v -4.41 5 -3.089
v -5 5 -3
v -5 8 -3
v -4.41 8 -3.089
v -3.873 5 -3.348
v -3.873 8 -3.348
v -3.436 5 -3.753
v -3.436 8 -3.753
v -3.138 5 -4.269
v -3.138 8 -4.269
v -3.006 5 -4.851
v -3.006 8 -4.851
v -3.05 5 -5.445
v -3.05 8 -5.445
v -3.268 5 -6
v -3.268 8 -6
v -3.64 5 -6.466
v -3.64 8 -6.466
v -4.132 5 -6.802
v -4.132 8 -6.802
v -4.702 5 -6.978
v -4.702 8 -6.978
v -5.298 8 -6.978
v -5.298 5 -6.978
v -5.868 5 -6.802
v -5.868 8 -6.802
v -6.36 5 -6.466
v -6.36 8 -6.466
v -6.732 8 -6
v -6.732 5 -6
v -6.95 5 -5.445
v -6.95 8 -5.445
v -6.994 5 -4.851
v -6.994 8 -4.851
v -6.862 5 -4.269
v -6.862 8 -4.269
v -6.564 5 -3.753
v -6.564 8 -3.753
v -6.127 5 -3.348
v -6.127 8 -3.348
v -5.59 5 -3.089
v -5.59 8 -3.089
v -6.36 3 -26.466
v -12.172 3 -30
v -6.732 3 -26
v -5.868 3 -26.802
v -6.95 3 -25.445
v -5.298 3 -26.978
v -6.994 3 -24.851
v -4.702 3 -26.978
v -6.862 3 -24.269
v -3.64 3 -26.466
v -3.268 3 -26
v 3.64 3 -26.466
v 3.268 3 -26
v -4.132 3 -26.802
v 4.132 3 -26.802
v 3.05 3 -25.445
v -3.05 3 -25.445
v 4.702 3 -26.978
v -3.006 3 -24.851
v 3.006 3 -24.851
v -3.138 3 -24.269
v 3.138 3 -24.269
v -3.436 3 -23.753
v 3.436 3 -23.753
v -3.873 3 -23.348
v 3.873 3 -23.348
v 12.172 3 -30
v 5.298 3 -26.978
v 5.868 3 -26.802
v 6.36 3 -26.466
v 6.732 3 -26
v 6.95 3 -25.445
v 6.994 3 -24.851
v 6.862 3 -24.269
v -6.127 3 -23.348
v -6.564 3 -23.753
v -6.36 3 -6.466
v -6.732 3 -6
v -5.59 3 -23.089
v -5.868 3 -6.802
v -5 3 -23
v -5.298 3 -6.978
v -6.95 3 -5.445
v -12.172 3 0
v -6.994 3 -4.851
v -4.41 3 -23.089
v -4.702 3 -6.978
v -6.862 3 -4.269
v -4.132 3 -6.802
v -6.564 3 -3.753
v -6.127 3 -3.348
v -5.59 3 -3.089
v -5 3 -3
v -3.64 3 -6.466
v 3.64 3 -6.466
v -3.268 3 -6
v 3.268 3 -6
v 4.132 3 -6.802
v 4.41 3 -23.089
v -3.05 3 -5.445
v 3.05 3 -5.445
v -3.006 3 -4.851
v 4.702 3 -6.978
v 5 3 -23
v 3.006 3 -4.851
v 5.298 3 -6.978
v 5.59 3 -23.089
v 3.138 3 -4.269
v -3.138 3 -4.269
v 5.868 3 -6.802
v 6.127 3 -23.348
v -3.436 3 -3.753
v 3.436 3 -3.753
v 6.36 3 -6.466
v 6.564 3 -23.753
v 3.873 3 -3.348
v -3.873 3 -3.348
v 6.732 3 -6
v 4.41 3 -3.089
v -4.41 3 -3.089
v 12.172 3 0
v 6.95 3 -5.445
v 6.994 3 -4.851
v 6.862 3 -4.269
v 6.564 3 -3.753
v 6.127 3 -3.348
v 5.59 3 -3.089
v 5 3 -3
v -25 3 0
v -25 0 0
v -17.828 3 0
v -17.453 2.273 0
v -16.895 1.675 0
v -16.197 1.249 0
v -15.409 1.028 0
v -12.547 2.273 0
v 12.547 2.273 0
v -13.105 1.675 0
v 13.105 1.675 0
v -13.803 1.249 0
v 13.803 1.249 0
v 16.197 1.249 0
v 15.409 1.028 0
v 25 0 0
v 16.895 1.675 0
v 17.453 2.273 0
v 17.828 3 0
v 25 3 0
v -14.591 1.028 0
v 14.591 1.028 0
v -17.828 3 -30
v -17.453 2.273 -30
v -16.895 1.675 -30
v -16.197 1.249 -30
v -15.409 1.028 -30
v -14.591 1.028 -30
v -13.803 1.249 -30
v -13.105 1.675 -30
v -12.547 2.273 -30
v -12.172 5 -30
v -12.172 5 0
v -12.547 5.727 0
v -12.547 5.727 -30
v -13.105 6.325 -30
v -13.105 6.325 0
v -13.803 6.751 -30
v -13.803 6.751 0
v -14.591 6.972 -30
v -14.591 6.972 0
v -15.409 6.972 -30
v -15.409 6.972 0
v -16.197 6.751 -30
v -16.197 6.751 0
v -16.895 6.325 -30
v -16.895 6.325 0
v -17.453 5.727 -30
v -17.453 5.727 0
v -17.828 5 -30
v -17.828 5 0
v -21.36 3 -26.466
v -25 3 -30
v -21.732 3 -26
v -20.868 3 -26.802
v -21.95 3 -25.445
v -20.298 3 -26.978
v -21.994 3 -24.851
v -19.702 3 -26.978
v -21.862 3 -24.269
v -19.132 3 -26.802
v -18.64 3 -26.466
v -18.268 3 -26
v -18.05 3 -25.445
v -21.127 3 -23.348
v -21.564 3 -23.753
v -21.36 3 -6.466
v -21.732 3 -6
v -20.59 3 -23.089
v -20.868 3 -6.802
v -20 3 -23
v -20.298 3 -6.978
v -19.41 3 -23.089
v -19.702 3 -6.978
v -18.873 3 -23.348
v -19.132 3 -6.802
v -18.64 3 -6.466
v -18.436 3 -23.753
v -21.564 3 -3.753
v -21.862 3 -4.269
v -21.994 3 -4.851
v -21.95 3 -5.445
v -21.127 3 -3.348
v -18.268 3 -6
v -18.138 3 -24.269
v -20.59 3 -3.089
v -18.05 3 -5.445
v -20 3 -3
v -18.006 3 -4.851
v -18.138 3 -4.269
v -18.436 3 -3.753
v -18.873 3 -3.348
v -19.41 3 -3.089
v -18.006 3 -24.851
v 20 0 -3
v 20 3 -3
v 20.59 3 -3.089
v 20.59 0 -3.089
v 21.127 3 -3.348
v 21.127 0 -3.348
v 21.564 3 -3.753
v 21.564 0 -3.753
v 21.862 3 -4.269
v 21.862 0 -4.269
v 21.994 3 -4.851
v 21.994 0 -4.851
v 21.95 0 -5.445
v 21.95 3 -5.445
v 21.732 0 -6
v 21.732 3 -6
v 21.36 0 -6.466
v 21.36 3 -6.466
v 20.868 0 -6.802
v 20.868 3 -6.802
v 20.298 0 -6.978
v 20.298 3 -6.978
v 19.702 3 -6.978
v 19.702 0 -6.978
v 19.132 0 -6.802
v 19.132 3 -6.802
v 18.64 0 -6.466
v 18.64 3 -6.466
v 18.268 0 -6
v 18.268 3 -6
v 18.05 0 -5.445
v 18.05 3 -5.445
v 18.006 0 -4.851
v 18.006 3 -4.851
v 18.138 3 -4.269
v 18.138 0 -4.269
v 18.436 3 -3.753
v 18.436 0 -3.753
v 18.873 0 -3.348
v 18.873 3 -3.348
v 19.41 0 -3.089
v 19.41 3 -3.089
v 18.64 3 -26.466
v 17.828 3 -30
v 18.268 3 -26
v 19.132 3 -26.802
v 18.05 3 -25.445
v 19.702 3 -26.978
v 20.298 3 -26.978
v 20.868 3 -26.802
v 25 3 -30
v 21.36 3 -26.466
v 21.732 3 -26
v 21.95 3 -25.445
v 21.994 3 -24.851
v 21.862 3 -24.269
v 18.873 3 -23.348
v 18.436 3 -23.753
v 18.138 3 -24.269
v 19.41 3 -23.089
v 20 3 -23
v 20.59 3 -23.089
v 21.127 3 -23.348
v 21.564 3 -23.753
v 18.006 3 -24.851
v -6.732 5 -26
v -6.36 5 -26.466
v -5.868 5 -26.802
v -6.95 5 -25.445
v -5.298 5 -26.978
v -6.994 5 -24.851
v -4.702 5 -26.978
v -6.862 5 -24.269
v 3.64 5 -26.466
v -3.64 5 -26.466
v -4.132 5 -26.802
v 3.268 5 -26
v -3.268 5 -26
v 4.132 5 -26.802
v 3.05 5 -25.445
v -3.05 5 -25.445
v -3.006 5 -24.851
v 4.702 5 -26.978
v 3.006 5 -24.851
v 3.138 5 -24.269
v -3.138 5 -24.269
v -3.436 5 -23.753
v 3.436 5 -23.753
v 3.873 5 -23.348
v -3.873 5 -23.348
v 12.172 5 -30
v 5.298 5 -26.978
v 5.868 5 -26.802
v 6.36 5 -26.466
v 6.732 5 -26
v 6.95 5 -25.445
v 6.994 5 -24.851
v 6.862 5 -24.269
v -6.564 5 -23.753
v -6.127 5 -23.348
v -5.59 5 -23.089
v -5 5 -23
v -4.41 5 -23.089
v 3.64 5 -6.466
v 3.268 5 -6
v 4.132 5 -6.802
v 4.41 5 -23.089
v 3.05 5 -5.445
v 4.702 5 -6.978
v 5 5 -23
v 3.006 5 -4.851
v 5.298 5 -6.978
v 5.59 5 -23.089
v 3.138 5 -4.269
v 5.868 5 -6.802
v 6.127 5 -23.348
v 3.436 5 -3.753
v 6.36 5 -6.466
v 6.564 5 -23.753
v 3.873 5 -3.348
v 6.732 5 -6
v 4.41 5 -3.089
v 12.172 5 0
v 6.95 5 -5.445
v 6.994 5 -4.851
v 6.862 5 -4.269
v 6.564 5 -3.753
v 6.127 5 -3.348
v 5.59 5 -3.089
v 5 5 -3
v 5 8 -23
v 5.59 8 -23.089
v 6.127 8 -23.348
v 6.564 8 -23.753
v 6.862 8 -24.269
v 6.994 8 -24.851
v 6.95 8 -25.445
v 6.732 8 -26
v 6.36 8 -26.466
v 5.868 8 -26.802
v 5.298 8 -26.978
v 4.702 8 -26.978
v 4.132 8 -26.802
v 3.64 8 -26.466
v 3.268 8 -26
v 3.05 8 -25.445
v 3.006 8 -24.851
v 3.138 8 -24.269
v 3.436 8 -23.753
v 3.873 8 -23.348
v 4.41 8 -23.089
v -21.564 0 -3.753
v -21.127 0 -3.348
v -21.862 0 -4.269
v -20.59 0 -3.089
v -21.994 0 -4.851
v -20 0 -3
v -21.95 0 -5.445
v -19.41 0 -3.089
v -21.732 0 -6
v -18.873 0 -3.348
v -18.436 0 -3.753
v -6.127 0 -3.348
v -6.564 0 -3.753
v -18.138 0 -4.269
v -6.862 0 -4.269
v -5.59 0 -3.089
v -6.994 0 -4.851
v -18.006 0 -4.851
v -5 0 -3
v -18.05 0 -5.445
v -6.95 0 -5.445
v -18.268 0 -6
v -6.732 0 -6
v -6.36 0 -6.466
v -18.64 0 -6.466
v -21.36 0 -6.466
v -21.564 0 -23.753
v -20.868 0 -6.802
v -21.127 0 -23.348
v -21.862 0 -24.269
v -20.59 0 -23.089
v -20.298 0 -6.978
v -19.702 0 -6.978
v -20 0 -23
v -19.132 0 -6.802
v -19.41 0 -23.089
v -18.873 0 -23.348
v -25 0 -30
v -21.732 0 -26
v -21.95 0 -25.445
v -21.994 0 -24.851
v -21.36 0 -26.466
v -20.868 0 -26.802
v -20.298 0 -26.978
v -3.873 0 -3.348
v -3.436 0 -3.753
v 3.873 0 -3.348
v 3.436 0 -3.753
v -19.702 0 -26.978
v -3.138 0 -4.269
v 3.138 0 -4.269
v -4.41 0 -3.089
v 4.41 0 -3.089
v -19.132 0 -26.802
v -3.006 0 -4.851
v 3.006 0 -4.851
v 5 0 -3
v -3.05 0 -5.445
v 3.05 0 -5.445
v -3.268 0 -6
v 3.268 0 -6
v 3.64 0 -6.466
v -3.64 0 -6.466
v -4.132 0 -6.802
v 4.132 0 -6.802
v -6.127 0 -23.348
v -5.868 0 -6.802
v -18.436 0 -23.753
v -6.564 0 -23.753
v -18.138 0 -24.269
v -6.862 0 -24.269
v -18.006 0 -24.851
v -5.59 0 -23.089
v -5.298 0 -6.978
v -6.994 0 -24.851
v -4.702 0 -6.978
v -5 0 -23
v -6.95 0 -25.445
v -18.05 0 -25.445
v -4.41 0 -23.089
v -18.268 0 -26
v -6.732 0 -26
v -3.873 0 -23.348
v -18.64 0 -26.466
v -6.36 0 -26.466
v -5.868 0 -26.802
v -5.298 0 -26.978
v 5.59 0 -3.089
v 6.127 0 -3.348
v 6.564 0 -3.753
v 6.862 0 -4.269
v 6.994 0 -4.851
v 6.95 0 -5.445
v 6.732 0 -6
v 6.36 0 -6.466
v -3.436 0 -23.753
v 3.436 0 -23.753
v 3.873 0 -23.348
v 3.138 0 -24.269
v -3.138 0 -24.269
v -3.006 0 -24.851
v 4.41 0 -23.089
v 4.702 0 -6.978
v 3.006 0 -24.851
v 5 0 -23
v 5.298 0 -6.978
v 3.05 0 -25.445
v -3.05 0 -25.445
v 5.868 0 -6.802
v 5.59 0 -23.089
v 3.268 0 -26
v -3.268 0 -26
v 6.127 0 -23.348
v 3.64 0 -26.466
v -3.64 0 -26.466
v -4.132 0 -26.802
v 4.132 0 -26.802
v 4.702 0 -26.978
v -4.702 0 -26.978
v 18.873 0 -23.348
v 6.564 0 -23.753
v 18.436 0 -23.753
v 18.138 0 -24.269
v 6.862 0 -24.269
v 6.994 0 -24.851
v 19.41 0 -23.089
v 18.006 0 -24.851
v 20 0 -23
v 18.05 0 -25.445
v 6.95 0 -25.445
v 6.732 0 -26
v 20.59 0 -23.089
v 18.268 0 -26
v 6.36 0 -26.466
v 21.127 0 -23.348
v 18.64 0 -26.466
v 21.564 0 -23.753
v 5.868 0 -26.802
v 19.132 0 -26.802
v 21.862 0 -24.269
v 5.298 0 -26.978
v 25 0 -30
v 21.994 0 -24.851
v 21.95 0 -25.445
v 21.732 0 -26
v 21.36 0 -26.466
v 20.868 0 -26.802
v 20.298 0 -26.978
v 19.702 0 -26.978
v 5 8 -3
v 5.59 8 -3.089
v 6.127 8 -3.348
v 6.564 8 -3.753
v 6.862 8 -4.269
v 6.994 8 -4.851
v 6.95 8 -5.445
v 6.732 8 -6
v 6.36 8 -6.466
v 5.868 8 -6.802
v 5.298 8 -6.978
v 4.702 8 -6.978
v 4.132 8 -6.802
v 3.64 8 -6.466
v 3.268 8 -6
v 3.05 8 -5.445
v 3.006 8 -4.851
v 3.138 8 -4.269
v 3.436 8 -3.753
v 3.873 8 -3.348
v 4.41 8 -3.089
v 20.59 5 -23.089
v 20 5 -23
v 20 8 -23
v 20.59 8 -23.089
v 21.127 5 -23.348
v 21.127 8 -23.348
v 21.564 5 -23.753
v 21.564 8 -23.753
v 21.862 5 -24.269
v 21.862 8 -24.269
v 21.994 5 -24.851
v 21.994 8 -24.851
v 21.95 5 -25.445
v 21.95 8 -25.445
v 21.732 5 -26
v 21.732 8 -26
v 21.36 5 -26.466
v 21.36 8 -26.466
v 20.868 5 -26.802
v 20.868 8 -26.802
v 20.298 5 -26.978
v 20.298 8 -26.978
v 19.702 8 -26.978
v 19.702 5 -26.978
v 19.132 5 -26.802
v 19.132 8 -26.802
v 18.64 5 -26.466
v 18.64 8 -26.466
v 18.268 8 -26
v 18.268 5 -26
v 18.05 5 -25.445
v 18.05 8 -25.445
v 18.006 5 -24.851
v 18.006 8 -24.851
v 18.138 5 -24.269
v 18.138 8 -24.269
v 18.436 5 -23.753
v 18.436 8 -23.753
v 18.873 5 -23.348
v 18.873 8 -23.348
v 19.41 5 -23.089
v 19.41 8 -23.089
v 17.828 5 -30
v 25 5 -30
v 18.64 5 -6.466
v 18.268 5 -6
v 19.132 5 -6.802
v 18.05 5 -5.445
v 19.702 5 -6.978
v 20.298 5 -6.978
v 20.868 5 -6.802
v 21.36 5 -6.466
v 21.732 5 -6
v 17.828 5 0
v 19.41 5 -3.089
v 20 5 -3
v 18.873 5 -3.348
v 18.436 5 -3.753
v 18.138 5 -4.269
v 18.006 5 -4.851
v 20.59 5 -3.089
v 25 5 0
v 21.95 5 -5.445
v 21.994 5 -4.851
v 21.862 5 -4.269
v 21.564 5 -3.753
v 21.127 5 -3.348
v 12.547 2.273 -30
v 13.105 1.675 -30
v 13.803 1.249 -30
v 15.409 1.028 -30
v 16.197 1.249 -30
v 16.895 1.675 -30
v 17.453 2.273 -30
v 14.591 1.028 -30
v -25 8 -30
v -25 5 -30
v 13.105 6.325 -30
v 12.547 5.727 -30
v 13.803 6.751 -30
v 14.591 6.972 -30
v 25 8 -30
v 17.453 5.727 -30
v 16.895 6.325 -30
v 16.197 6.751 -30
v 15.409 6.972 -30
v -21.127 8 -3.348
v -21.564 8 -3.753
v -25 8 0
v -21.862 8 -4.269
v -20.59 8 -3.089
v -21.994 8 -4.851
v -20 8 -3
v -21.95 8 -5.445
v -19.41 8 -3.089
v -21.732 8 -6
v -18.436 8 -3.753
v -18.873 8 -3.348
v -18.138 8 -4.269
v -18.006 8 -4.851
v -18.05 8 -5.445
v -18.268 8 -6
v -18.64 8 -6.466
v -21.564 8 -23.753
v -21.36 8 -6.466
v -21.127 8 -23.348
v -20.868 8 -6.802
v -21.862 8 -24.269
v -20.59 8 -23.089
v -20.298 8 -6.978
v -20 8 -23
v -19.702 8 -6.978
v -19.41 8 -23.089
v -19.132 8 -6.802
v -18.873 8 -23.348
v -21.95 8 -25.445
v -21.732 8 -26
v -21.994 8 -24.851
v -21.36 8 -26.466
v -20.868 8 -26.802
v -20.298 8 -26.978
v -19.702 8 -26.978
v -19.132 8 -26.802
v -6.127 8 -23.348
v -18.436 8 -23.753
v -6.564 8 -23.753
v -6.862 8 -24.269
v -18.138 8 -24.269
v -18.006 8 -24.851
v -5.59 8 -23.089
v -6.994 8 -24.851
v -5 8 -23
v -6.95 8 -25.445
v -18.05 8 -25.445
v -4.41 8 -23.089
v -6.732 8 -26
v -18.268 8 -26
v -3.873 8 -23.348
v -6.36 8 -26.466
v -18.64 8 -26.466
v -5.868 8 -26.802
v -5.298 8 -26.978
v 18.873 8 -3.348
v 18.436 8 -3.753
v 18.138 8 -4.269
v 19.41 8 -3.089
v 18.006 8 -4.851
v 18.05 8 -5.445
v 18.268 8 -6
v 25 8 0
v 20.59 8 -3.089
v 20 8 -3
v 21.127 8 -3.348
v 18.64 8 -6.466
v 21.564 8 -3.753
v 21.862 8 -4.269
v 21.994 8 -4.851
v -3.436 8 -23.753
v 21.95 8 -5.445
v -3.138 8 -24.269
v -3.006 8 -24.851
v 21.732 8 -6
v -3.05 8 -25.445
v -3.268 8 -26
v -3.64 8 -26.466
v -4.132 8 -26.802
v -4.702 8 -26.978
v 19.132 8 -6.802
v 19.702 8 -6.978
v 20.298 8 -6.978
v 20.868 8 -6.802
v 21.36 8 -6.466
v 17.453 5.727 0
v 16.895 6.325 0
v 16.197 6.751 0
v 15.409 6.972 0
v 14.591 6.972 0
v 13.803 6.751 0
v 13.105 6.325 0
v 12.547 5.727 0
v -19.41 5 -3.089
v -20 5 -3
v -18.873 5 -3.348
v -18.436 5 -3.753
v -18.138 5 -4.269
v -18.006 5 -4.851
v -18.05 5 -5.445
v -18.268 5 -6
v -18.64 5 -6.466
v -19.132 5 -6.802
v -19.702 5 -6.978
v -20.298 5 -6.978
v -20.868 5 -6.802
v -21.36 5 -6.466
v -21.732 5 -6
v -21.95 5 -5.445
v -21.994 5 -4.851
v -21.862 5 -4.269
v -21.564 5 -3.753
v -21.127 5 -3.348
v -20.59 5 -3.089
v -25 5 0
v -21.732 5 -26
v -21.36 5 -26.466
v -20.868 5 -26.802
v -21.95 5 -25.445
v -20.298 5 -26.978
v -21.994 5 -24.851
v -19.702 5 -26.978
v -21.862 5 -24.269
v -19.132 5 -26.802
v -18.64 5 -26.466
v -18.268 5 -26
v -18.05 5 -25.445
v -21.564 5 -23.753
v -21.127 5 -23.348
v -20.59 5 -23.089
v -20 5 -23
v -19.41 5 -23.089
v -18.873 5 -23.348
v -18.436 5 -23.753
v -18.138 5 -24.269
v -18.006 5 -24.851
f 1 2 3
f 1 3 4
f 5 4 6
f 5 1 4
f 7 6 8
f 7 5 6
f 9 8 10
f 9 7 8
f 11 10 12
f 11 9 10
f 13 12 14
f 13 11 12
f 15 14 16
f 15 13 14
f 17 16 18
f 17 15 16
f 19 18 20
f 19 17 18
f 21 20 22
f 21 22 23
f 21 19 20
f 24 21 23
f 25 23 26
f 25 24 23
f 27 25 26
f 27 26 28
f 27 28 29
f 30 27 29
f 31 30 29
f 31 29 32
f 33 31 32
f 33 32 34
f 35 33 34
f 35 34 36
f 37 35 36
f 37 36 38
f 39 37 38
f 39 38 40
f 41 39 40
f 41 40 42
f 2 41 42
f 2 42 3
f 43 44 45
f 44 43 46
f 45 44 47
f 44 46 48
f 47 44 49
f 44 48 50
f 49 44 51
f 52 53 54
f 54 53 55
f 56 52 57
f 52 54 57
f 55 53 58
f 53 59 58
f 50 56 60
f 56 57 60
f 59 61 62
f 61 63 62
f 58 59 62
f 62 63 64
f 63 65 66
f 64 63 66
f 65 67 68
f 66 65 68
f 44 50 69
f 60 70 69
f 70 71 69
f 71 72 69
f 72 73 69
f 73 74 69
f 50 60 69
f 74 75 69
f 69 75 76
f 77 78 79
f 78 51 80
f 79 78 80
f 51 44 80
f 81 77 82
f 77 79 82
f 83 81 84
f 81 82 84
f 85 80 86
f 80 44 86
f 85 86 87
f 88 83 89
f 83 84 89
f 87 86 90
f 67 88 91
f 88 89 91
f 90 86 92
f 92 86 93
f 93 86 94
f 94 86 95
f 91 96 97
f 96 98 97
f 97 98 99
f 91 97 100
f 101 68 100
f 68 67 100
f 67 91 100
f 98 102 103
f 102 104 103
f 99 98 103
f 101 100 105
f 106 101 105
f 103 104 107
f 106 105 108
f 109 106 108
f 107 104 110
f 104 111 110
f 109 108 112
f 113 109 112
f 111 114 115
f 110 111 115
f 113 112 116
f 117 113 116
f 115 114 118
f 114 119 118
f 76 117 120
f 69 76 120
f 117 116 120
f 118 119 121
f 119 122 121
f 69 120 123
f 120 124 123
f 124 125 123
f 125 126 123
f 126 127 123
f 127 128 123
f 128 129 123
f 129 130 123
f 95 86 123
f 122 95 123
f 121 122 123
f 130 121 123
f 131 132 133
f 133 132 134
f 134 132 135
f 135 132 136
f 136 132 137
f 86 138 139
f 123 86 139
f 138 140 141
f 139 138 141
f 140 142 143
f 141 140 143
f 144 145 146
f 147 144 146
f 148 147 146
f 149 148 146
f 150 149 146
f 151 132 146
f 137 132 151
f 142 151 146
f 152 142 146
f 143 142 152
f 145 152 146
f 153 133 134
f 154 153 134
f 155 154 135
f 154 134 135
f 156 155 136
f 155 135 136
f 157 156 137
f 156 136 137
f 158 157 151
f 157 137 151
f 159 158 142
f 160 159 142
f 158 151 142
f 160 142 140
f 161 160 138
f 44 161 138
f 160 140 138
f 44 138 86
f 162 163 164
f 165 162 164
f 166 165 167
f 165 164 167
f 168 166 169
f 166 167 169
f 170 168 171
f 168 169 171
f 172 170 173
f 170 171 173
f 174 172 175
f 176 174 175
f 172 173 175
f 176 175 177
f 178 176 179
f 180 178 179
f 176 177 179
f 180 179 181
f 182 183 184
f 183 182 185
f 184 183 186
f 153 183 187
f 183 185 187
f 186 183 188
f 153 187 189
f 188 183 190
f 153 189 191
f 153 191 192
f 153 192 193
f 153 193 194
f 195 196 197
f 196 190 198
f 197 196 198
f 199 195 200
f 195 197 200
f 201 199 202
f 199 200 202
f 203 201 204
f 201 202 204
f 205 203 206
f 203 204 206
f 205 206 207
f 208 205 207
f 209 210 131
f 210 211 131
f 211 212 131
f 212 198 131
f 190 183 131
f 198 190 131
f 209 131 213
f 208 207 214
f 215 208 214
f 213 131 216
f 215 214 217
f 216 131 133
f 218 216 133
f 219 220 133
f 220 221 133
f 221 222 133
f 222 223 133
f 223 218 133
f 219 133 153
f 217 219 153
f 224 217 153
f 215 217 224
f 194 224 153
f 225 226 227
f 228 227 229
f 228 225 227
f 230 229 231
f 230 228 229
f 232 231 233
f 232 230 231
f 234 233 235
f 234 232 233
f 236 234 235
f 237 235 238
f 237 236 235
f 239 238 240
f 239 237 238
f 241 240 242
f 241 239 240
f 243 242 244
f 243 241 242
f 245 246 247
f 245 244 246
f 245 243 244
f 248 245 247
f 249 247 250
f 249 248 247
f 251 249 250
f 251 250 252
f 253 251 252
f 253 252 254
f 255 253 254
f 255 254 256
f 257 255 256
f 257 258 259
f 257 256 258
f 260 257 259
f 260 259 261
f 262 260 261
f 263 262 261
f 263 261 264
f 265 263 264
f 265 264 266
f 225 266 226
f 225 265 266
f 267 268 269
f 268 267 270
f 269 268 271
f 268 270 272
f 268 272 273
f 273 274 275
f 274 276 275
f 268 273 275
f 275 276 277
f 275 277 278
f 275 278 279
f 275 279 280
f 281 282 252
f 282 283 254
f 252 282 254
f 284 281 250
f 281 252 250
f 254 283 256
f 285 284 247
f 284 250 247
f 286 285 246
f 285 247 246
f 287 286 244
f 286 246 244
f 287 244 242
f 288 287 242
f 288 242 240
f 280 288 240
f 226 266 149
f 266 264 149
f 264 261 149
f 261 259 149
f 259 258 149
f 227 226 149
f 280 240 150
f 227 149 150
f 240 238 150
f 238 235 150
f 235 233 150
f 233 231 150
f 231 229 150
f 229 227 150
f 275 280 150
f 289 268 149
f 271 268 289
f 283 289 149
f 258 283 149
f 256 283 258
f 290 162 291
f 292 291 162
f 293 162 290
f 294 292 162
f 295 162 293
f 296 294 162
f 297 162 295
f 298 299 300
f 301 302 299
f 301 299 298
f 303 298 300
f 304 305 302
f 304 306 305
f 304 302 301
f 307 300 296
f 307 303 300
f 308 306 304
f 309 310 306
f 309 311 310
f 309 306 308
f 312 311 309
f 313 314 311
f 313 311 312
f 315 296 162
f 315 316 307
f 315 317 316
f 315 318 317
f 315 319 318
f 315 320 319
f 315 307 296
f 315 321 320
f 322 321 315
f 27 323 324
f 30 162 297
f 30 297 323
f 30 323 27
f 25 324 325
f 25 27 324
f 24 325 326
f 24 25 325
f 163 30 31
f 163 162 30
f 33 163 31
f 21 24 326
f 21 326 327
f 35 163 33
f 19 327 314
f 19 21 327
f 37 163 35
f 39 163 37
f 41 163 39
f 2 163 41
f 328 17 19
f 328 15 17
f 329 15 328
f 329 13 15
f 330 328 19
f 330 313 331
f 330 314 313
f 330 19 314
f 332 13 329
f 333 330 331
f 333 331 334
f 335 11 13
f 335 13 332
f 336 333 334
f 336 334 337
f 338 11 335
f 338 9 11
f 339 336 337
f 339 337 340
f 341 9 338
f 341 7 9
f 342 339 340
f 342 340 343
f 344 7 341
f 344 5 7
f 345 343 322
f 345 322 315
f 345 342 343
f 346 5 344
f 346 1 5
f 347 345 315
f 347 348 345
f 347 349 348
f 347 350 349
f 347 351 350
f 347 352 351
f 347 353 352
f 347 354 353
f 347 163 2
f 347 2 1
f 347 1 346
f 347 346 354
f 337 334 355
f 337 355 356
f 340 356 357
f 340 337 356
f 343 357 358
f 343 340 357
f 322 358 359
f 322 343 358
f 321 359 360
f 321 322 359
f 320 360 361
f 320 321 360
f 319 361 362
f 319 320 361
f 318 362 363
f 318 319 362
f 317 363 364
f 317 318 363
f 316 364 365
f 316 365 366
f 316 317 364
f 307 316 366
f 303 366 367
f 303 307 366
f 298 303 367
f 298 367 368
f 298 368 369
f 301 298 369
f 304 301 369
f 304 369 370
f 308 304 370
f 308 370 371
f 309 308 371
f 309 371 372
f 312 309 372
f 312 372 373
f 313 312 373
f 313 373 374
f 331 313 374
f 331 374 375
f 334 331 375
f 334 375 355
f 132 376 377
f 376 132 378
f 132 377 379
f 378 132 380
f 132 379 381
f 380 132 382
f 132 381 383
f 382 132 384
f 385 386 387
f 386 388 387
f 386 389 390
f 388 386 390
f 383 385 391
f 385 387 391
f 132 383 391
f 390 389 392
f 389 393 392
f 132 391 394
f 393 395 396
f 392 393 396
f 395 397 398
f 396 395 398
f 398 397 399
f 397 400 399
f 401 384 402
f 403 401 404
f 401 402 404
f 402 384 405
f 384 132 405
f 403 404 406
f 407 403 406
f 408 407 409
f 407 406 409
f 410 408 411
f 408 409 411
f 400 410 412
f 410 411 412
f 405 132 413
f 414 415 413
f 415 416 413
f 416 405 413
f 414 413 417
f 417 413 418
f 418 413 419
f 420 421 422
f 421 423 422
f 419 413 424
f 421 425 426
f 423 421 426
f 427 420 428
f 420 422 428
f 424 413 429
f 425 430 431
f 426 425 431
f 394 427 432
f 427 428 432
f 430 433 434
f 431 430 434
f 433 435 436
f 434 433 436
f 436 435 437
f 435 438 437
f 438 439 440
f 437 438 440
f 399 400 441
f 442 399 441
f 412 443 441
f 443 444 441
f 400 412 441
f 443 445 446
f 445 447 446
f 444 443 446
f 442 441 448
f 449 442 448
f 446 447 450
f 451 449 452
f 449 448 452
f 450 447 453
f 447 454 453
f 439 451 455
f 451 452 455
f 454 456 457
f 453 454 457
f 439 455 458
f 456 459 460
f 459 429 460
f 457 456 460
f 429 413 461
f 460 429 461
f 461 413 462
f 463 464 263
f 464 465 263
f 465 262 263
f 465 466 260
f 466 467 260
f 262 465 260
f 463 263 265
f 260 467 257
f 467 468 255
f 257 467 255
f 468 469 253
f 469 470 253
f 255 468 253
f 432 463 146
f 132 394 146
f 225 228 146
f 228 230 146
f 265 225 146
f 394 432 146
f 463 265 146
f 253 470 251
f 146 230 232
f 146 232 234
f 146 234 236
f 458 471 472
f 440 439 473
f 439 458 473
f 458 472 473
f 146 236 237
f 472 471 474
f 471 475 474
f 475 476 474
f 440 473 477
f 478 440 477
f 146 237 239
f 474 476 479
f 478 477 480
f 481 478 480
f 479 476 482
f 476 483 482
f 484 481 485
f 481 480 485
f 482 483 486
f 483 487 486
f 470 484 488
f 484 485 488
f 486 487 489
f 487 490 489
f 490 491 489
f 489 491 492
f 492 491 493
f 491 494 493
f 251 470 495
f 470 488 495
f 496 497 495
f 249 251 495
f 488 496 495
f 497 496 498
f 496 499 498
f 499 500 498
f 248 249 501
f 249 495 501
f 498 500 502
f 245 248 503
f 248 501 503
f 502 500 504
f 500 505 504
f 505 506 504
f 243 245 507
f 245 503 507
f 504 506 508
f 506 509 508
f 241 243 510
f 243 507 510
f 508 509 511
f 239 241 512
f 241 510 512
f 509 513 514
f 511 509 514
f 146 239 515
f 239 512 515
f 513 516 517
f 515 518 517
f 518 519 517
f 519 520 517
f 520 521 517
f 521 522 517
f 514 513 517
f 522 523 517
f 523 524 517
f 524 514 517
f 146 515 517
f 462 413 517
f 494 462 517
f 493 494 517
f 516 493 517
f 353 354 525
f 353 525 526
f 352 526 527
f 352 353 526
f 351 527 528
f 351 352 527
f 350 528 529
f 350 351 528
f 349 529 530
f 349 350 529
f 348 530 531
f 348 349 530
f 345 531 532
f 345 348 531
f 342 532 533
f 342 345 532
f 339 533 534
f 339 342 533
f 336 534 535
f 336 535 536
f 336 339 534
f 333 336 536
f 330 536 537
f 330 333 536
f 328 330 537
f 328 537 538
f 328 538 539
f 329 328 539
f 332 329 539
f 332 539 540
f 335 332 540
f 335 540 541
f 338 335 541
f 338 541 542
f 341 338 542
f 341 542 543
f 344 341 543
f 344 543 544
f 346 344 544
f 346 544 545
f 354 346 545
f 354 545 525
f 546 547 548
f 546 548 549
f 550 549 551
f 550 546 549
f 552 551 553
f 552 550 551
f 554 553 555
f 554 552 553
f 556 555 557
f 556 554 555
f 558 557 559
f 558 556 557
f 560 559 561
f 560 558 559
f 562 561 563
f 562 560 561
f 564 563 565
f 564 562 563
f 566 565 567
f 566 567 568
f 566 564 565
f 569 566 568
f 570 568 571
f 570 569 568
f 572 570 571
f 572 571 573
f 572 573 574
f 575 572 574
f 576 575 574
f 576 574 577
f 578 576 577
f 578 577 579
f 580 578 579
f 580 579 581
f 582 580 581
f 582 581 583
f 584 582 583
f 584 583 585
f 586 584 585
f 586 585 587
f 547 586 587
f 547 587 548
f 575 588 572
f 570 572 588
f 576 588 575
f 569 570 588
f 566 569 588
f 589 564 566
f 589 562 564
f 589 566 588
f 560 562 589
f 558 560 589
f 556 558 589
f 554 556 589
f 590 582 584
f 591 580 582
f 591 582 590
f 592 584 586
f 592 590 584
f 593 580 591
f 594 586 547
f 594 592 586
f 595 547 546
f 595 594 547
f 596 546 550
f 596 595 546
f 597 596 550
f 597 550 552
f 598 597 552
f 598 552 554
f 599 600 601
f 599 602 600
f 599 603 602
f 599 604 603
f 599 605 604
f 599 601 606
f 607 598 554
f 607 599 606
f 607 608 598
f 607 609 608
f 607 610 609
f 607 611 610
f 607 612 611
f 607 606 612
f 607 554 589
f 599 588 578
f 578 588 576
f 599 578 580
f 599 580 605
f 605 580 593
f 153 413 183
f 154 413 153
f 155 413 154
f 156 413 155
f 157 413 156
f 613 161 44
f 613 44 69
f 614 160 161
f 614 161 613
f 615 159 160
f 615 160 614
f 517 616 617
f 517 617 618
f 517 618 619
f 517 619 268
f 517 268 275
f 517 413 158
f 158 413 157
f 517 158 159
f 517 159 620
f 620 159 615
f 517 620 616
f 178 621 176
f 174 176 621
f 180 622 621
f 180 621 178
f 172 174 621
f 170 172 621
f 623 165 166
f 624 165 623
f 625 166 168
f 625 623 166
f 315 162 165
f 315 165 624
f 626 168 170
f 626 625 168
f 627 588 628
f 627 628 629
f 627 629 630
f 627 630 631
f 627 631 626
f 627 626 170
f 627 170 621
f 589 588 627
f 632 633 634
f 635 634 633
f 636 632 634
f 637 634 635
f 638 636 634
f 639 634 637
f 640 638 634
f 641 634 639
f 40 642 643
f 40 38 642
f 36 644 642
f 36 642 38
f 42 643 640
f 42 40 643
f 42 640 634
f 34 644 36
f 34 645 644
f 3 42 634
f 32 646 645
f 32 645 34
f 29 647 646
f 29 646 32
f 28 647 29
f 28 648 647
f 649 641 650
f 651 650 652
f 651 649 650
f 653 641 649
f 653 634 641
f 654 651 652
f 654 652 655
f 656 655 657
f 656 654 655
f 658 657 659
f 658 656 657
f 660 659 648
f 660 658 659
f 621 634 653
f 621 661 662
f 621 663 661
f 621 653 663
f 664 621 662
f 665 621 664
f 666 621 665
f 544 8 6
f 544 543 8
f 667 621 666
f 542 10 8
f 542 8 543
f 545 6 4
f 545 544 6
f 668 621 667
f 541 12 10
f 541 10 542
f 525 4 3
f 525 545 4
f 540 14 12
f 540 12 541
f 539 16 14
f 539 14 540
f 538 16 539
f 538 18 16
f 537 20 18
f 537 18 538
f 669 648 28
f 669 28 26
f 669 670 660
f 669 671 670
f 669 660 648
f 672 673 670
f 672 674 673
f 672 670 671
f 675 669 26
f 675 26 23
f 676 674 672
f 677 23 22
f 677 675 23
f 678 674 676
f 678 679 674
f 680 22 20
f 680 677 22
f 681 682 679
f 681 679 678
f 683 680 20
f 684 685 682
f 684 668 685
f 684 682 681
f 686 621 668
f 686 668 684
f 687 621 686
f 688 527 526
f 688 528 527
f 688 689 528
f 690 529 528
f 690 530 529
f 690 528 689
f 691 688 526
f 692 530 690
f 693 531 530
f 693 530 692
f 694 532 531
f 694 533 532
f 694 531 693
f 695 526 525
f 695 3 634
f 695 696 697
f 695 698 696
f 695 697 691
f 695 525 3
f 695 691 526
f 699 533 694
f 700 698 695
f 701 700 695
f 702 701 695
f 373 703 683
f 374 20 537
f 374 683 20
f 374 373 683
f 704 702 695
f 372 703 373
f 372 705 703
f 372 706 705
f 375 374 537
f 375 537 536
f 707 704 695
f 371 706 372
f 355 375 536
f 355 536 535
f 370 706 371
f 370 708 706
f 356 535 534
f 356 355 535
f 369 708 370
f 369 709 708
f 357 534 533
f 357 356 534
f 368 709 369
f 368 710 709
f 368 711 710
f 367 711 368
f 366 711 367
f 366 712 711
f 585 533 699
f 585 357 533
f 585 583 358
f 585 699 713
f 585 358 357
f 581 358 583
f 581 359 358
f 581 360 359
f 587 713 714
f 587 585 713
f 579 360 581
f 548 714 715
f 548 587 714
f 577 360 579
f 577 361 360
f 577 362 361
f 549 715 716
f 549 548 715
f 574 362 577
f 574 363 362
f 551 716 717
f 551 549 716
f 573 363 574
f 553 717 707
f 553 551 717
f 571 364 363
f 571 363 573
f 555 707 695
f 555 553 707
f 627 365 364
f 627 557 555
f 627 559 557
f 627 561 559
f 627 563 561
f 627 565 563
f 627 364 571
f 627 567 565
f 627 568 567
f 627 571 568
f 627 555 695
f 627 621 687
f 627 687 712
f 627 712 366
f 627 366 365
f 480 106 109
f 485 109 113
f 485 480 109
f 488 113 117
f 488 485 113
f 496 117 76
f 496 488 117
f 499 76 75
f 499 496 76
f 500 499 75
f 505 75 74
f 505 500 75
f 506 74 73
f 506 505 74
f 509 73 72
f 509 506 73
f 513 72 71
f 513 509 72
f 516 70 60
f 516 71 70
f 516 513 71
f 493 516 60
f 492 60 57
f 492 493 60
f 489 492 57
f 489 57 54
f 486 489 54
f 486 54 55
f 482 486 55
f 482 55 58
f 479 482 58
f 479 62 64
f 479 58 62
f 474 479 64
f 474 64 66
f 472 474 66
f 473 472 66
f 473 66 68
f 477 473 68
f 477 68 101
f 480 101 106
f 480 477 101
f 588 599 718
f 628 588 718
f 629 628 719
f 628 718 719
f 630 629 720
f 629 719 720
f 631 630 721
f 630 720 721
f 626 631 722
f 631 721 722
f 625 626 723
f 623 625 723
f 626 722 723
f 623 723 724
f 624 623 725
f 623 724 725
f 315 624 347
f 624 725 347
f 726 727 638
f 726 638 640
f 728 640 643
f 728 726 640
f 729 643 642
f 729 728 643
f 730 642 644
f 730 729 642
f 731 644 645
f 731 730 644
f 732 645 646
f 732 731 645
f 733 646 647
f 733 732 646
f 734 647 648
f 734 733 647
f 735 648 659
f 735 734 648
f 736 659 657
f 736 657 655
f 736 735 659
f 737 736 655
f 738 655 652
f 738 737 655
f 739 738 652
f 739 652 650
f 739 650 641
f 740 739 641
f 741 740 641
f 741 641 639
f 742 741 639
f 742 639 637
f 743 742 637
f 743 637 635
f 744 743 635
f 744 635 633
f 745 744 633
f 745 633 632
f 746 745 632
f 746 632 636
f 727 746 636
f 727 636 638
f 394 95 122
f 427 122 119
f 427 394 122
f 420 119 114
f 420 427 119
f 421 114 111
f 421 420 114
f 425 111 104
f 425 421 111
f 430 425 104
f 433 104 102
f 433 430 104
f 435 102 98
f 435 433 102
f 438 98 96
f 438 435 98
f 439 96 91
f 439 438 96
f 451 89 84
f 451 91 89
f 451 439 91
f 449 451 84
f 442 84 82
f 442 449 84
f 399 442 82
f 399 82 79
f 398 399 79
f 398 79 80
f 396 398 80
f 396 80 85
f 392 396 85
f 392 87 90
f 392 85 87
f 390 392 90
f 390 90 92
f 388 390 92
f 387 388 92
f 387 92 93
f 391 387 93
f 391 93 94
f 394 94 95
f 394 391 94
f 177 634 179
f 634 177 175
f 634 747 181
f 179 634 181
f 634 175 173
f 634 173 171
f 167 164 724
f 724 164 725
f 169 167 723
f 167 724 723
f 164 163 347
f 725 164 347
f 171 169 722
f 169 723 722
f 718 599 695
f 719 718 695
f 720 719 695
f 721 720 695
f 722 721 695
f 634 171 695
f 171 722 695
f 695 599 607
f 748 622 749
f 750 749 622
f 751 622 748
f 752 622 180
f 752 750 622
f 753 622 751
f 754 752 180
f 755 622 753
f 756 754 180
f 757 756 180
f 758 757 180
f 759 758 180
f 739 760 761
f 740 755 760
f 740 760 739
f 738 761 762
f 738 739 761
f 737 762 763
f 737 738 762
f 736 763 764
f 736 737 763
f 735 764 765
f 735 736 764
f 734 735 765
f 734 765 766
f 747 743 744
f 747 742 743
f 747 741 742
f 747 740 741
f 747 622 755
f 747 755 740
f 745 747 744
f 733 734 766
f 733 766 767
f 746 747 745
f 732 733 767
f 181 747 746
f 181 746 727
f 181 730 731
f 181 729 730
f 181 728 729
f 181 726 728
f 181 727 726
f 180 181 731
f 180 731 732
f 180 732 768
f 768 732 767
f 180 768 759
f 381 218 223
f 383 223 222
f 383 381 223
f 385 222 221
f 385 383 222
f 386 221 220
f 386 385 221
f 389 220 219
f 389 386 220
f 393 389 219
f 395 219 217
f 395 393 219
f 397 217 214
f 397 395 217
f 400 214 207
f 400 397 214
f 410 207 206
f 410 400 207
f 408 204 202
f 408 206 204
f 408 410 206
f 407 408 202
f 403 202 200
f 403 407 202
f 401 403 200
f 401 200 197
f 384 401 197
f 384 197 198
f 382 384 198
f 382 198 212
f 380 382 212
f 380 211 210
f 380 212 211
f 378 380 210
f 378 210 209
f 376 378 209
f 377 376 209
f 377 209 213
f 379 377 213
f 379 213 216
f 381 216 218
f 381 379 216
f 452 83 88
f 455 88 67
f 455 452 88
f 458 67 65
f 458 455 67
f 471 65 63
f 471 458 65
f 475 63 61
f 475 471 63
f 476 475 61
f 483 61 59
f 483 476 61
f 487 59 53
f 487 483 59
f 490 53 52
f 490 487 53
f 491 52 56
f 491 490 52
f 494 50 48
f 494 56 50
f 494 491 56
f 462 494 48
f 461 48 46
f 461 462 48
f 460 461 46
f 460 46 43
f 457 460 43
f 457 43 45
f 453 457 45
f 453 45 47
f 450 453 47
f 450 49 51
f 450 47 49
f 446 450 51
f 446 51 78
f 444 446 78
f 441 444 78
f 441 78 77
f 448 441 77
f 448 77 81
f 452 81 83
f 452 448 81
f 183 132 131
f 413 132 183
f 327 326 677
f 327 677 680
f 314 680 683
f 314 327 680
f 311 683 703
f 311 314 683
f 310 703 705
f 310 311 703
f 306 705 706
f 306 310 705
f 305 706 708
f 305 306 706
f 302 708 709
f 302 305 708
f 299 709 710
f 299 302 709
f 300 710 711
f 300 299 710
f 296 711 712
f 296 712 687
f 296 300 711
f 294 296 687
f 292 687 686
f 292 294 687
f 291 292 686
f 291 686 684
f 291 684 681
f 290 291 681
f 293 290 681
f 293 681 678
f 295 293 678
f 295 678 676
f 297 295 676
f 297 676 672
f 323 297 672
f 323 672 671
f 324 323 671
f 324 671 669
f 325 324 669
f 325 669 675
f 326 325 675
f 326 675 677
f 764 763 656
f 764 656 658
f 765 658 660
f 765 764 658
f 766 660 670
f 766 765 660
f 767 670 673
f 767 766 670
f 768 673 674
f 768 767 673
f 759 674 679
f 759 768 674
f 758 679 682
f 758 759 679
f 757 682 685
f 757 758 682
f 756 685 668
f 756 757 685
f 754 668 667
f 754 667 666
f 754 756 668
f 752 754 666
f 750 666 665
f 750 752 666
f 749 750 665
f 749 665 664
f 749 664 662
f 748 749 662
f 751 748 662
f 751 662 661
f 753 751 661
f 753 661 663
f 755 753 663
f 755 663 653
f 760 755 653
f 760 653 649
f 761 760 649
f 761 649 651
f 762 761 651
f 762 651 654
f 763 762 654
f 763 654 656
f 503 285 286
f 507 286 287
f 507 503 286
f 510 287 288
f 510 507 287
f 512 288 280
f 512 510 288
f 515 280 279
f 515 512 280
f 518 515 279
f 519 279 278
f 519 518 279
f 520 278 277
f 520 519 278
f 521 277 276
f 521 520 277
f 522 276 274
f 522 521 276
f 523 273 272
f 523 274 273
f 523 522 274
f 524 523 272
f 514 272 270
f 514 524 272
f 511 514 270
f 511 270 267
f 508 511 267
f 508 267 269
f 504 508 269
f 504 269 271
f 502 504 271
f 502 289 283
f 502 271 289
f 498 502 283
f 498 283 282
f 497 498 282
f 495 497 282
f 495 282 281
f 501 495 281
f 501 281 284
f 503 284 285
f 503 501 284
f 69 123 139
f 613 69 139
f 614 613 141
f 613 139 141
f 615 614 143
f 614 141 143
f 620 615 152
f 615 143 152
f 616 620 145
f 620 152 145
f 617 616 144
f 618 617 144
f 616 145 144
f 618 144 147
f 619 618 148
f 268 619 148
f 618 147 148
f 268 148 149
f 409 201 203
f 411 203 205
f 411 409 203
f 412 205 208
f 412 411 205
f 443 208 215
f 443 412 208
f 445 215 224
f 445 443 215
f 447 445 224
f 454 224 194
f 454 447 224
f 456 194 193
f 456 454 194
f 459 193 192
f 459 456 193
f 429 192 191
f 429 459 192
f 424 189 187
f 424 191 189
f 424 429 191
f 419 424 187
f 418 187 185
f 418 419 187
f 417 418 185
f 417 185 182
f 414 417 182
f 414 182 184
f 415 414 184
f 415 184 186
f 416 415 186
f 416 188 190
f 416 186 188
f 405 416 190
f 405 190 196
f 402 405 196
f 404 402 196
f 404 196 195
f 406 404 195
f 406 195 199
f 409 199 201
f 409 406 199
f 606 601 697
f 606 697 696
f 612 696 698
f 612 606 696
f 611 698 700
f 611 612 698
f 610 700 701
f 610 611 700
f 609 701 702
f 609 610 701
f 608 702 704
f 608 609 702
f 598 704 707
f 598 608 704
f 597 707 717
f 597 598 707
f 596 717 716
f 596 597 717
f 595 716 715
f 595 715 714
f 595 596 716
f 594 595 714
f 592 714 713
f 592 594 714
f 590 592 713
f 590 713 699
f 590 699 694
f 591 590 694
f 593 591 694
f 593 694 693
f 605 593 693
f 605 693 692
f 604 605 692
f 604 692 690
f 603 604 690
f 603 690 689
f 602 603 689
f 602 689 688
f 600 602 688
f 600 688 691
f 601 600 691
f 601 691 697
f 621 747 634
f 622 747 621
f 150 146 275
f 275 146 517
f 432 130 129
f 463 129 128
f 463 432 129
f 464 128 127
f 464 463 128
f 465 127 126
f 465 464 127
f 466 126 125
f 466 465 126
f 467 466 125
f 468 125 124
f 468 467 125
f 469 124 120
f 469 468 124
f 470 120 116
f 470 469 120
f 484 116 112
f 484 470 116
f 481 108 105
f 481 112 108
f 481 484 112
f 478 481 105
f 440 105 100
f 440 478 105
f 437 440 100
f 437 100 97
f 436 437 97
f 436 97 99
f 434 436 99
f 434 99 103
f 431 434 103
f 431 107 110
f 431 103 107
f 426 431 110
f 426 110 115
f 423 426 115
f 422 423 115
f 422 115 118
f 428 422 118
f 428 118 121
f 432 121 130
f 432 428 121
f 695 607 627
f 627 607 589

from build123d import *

# Parameters (mm, degrees)
SKETCH_1_W          = 25
SKETCH_1_H          = 30
SKETCH_1_R          = 2
EXTRUDE_1_DEPTH     = 8
SKETCH_2_R          = 3
SKETCH_2_W          = 50
SKETCH_2_H          = 2
CUT_EXTRUDE_1_DEPTH = 40.862262856


with BuildPart() as part:
    # 스케치1 → 보스-돌출1 (new body)
    # profile 1 of 2: a face of its own
    with BuildSketch(Plane(origin=(0, 0, 0), x_dir=(1, 0, 0), z_dir=(0, 1, 0))):
        with Locations((-12.5, 15)):
            Rectangle(SKETCH_1_W, SKETCH_1_H)
        with Locations(Location((-20, 5, 0), (0, 0, 270))):
            Circle(SKETCH_1_R, mode=Mode.SUBTRACT)
        with Locations(Location((-20, 25, 0), (0, 0, 270))):
            Circle(SKETCH_1_R, mode=Mode.SUBTRACT)
        with Locations(Location((-5, 5, 0), (0, 0, 270))):
            Circle(SKETCH_1_R, mode=Mode.SUBTRACT)
        with Locations(Location((-5, 25, 0), (0, 0, 270))):
            Circle(SKETCH_1_R, mode=Mode.SUBTRACT)
    # profile 2 of 2: a face of its own
    with BuildSketch(Plane(origin=(0, 0, 0), x_dir=(1, 0, 0), z_dir=(0, 1, 0))):
        with Locations((12.5, 15)):
            Rectangle(SKETCH_1_W, SKETCH_1_H)
        with Locations(Location((5, 5, 0), (0, 0, 270))):
            Circle(SKETCH_1_R, mode=Mode.SUBTRACT)
        with Locations(Location((5, 25, 0), (0, 0, 270))):
            Circle(SKETCH_1_R, mode=Mode.SUBTRACT)
        with Locations(Location((20, 5, 0), (0, 0, 270))):
            Circle(SKETCH_1_R, mode=Mode.SUBTRACT)
        with Locations(Location((20, 25, 0), (0, 0, 270))):
            Circle(SKETCH_1_R, mode=Mode.SUBTRACT)
    extrude(amount=EXTRUDE_1_DEPTH)

    # 스케치2 → 컷-돌출1 (cut, through all)
    with BuildSketch(Plane.XY):
        with Locations((-15, 4)):
            Circle(SKETCH_2_R)
        with Locations((15, 4)):
            Circle(SKETCH_2_R)
        with Locations((0, 4)):
            Rectangle(SKETCH_2_W, SKETCH_2_H)
    extrude(amount=-CUT_EXTRUDE_1_DEPTH, mode=Mode.SUBTRACT)


with BuildPart() as cut_extrude_1_piece_1:
    # of the separate pieces the step leaves, piece 1, a body of its own (cut_extrude_1_pieces)
    add(part.part.solids().sort_by_distance((-25, 0, 0))[0])


with BuildPart() as cut_extrude_1_piece_2:
    # of the separate pieces the step leaves, piece 2, a body of its own (cut_extrude_1_pieces)
    add(part.part.solids().sort_by_distance((-25, 5, 0))[0])


solid = Compound([cut_extrude_1_piece_1.part, cut_extrude_1_piece_2.part])
